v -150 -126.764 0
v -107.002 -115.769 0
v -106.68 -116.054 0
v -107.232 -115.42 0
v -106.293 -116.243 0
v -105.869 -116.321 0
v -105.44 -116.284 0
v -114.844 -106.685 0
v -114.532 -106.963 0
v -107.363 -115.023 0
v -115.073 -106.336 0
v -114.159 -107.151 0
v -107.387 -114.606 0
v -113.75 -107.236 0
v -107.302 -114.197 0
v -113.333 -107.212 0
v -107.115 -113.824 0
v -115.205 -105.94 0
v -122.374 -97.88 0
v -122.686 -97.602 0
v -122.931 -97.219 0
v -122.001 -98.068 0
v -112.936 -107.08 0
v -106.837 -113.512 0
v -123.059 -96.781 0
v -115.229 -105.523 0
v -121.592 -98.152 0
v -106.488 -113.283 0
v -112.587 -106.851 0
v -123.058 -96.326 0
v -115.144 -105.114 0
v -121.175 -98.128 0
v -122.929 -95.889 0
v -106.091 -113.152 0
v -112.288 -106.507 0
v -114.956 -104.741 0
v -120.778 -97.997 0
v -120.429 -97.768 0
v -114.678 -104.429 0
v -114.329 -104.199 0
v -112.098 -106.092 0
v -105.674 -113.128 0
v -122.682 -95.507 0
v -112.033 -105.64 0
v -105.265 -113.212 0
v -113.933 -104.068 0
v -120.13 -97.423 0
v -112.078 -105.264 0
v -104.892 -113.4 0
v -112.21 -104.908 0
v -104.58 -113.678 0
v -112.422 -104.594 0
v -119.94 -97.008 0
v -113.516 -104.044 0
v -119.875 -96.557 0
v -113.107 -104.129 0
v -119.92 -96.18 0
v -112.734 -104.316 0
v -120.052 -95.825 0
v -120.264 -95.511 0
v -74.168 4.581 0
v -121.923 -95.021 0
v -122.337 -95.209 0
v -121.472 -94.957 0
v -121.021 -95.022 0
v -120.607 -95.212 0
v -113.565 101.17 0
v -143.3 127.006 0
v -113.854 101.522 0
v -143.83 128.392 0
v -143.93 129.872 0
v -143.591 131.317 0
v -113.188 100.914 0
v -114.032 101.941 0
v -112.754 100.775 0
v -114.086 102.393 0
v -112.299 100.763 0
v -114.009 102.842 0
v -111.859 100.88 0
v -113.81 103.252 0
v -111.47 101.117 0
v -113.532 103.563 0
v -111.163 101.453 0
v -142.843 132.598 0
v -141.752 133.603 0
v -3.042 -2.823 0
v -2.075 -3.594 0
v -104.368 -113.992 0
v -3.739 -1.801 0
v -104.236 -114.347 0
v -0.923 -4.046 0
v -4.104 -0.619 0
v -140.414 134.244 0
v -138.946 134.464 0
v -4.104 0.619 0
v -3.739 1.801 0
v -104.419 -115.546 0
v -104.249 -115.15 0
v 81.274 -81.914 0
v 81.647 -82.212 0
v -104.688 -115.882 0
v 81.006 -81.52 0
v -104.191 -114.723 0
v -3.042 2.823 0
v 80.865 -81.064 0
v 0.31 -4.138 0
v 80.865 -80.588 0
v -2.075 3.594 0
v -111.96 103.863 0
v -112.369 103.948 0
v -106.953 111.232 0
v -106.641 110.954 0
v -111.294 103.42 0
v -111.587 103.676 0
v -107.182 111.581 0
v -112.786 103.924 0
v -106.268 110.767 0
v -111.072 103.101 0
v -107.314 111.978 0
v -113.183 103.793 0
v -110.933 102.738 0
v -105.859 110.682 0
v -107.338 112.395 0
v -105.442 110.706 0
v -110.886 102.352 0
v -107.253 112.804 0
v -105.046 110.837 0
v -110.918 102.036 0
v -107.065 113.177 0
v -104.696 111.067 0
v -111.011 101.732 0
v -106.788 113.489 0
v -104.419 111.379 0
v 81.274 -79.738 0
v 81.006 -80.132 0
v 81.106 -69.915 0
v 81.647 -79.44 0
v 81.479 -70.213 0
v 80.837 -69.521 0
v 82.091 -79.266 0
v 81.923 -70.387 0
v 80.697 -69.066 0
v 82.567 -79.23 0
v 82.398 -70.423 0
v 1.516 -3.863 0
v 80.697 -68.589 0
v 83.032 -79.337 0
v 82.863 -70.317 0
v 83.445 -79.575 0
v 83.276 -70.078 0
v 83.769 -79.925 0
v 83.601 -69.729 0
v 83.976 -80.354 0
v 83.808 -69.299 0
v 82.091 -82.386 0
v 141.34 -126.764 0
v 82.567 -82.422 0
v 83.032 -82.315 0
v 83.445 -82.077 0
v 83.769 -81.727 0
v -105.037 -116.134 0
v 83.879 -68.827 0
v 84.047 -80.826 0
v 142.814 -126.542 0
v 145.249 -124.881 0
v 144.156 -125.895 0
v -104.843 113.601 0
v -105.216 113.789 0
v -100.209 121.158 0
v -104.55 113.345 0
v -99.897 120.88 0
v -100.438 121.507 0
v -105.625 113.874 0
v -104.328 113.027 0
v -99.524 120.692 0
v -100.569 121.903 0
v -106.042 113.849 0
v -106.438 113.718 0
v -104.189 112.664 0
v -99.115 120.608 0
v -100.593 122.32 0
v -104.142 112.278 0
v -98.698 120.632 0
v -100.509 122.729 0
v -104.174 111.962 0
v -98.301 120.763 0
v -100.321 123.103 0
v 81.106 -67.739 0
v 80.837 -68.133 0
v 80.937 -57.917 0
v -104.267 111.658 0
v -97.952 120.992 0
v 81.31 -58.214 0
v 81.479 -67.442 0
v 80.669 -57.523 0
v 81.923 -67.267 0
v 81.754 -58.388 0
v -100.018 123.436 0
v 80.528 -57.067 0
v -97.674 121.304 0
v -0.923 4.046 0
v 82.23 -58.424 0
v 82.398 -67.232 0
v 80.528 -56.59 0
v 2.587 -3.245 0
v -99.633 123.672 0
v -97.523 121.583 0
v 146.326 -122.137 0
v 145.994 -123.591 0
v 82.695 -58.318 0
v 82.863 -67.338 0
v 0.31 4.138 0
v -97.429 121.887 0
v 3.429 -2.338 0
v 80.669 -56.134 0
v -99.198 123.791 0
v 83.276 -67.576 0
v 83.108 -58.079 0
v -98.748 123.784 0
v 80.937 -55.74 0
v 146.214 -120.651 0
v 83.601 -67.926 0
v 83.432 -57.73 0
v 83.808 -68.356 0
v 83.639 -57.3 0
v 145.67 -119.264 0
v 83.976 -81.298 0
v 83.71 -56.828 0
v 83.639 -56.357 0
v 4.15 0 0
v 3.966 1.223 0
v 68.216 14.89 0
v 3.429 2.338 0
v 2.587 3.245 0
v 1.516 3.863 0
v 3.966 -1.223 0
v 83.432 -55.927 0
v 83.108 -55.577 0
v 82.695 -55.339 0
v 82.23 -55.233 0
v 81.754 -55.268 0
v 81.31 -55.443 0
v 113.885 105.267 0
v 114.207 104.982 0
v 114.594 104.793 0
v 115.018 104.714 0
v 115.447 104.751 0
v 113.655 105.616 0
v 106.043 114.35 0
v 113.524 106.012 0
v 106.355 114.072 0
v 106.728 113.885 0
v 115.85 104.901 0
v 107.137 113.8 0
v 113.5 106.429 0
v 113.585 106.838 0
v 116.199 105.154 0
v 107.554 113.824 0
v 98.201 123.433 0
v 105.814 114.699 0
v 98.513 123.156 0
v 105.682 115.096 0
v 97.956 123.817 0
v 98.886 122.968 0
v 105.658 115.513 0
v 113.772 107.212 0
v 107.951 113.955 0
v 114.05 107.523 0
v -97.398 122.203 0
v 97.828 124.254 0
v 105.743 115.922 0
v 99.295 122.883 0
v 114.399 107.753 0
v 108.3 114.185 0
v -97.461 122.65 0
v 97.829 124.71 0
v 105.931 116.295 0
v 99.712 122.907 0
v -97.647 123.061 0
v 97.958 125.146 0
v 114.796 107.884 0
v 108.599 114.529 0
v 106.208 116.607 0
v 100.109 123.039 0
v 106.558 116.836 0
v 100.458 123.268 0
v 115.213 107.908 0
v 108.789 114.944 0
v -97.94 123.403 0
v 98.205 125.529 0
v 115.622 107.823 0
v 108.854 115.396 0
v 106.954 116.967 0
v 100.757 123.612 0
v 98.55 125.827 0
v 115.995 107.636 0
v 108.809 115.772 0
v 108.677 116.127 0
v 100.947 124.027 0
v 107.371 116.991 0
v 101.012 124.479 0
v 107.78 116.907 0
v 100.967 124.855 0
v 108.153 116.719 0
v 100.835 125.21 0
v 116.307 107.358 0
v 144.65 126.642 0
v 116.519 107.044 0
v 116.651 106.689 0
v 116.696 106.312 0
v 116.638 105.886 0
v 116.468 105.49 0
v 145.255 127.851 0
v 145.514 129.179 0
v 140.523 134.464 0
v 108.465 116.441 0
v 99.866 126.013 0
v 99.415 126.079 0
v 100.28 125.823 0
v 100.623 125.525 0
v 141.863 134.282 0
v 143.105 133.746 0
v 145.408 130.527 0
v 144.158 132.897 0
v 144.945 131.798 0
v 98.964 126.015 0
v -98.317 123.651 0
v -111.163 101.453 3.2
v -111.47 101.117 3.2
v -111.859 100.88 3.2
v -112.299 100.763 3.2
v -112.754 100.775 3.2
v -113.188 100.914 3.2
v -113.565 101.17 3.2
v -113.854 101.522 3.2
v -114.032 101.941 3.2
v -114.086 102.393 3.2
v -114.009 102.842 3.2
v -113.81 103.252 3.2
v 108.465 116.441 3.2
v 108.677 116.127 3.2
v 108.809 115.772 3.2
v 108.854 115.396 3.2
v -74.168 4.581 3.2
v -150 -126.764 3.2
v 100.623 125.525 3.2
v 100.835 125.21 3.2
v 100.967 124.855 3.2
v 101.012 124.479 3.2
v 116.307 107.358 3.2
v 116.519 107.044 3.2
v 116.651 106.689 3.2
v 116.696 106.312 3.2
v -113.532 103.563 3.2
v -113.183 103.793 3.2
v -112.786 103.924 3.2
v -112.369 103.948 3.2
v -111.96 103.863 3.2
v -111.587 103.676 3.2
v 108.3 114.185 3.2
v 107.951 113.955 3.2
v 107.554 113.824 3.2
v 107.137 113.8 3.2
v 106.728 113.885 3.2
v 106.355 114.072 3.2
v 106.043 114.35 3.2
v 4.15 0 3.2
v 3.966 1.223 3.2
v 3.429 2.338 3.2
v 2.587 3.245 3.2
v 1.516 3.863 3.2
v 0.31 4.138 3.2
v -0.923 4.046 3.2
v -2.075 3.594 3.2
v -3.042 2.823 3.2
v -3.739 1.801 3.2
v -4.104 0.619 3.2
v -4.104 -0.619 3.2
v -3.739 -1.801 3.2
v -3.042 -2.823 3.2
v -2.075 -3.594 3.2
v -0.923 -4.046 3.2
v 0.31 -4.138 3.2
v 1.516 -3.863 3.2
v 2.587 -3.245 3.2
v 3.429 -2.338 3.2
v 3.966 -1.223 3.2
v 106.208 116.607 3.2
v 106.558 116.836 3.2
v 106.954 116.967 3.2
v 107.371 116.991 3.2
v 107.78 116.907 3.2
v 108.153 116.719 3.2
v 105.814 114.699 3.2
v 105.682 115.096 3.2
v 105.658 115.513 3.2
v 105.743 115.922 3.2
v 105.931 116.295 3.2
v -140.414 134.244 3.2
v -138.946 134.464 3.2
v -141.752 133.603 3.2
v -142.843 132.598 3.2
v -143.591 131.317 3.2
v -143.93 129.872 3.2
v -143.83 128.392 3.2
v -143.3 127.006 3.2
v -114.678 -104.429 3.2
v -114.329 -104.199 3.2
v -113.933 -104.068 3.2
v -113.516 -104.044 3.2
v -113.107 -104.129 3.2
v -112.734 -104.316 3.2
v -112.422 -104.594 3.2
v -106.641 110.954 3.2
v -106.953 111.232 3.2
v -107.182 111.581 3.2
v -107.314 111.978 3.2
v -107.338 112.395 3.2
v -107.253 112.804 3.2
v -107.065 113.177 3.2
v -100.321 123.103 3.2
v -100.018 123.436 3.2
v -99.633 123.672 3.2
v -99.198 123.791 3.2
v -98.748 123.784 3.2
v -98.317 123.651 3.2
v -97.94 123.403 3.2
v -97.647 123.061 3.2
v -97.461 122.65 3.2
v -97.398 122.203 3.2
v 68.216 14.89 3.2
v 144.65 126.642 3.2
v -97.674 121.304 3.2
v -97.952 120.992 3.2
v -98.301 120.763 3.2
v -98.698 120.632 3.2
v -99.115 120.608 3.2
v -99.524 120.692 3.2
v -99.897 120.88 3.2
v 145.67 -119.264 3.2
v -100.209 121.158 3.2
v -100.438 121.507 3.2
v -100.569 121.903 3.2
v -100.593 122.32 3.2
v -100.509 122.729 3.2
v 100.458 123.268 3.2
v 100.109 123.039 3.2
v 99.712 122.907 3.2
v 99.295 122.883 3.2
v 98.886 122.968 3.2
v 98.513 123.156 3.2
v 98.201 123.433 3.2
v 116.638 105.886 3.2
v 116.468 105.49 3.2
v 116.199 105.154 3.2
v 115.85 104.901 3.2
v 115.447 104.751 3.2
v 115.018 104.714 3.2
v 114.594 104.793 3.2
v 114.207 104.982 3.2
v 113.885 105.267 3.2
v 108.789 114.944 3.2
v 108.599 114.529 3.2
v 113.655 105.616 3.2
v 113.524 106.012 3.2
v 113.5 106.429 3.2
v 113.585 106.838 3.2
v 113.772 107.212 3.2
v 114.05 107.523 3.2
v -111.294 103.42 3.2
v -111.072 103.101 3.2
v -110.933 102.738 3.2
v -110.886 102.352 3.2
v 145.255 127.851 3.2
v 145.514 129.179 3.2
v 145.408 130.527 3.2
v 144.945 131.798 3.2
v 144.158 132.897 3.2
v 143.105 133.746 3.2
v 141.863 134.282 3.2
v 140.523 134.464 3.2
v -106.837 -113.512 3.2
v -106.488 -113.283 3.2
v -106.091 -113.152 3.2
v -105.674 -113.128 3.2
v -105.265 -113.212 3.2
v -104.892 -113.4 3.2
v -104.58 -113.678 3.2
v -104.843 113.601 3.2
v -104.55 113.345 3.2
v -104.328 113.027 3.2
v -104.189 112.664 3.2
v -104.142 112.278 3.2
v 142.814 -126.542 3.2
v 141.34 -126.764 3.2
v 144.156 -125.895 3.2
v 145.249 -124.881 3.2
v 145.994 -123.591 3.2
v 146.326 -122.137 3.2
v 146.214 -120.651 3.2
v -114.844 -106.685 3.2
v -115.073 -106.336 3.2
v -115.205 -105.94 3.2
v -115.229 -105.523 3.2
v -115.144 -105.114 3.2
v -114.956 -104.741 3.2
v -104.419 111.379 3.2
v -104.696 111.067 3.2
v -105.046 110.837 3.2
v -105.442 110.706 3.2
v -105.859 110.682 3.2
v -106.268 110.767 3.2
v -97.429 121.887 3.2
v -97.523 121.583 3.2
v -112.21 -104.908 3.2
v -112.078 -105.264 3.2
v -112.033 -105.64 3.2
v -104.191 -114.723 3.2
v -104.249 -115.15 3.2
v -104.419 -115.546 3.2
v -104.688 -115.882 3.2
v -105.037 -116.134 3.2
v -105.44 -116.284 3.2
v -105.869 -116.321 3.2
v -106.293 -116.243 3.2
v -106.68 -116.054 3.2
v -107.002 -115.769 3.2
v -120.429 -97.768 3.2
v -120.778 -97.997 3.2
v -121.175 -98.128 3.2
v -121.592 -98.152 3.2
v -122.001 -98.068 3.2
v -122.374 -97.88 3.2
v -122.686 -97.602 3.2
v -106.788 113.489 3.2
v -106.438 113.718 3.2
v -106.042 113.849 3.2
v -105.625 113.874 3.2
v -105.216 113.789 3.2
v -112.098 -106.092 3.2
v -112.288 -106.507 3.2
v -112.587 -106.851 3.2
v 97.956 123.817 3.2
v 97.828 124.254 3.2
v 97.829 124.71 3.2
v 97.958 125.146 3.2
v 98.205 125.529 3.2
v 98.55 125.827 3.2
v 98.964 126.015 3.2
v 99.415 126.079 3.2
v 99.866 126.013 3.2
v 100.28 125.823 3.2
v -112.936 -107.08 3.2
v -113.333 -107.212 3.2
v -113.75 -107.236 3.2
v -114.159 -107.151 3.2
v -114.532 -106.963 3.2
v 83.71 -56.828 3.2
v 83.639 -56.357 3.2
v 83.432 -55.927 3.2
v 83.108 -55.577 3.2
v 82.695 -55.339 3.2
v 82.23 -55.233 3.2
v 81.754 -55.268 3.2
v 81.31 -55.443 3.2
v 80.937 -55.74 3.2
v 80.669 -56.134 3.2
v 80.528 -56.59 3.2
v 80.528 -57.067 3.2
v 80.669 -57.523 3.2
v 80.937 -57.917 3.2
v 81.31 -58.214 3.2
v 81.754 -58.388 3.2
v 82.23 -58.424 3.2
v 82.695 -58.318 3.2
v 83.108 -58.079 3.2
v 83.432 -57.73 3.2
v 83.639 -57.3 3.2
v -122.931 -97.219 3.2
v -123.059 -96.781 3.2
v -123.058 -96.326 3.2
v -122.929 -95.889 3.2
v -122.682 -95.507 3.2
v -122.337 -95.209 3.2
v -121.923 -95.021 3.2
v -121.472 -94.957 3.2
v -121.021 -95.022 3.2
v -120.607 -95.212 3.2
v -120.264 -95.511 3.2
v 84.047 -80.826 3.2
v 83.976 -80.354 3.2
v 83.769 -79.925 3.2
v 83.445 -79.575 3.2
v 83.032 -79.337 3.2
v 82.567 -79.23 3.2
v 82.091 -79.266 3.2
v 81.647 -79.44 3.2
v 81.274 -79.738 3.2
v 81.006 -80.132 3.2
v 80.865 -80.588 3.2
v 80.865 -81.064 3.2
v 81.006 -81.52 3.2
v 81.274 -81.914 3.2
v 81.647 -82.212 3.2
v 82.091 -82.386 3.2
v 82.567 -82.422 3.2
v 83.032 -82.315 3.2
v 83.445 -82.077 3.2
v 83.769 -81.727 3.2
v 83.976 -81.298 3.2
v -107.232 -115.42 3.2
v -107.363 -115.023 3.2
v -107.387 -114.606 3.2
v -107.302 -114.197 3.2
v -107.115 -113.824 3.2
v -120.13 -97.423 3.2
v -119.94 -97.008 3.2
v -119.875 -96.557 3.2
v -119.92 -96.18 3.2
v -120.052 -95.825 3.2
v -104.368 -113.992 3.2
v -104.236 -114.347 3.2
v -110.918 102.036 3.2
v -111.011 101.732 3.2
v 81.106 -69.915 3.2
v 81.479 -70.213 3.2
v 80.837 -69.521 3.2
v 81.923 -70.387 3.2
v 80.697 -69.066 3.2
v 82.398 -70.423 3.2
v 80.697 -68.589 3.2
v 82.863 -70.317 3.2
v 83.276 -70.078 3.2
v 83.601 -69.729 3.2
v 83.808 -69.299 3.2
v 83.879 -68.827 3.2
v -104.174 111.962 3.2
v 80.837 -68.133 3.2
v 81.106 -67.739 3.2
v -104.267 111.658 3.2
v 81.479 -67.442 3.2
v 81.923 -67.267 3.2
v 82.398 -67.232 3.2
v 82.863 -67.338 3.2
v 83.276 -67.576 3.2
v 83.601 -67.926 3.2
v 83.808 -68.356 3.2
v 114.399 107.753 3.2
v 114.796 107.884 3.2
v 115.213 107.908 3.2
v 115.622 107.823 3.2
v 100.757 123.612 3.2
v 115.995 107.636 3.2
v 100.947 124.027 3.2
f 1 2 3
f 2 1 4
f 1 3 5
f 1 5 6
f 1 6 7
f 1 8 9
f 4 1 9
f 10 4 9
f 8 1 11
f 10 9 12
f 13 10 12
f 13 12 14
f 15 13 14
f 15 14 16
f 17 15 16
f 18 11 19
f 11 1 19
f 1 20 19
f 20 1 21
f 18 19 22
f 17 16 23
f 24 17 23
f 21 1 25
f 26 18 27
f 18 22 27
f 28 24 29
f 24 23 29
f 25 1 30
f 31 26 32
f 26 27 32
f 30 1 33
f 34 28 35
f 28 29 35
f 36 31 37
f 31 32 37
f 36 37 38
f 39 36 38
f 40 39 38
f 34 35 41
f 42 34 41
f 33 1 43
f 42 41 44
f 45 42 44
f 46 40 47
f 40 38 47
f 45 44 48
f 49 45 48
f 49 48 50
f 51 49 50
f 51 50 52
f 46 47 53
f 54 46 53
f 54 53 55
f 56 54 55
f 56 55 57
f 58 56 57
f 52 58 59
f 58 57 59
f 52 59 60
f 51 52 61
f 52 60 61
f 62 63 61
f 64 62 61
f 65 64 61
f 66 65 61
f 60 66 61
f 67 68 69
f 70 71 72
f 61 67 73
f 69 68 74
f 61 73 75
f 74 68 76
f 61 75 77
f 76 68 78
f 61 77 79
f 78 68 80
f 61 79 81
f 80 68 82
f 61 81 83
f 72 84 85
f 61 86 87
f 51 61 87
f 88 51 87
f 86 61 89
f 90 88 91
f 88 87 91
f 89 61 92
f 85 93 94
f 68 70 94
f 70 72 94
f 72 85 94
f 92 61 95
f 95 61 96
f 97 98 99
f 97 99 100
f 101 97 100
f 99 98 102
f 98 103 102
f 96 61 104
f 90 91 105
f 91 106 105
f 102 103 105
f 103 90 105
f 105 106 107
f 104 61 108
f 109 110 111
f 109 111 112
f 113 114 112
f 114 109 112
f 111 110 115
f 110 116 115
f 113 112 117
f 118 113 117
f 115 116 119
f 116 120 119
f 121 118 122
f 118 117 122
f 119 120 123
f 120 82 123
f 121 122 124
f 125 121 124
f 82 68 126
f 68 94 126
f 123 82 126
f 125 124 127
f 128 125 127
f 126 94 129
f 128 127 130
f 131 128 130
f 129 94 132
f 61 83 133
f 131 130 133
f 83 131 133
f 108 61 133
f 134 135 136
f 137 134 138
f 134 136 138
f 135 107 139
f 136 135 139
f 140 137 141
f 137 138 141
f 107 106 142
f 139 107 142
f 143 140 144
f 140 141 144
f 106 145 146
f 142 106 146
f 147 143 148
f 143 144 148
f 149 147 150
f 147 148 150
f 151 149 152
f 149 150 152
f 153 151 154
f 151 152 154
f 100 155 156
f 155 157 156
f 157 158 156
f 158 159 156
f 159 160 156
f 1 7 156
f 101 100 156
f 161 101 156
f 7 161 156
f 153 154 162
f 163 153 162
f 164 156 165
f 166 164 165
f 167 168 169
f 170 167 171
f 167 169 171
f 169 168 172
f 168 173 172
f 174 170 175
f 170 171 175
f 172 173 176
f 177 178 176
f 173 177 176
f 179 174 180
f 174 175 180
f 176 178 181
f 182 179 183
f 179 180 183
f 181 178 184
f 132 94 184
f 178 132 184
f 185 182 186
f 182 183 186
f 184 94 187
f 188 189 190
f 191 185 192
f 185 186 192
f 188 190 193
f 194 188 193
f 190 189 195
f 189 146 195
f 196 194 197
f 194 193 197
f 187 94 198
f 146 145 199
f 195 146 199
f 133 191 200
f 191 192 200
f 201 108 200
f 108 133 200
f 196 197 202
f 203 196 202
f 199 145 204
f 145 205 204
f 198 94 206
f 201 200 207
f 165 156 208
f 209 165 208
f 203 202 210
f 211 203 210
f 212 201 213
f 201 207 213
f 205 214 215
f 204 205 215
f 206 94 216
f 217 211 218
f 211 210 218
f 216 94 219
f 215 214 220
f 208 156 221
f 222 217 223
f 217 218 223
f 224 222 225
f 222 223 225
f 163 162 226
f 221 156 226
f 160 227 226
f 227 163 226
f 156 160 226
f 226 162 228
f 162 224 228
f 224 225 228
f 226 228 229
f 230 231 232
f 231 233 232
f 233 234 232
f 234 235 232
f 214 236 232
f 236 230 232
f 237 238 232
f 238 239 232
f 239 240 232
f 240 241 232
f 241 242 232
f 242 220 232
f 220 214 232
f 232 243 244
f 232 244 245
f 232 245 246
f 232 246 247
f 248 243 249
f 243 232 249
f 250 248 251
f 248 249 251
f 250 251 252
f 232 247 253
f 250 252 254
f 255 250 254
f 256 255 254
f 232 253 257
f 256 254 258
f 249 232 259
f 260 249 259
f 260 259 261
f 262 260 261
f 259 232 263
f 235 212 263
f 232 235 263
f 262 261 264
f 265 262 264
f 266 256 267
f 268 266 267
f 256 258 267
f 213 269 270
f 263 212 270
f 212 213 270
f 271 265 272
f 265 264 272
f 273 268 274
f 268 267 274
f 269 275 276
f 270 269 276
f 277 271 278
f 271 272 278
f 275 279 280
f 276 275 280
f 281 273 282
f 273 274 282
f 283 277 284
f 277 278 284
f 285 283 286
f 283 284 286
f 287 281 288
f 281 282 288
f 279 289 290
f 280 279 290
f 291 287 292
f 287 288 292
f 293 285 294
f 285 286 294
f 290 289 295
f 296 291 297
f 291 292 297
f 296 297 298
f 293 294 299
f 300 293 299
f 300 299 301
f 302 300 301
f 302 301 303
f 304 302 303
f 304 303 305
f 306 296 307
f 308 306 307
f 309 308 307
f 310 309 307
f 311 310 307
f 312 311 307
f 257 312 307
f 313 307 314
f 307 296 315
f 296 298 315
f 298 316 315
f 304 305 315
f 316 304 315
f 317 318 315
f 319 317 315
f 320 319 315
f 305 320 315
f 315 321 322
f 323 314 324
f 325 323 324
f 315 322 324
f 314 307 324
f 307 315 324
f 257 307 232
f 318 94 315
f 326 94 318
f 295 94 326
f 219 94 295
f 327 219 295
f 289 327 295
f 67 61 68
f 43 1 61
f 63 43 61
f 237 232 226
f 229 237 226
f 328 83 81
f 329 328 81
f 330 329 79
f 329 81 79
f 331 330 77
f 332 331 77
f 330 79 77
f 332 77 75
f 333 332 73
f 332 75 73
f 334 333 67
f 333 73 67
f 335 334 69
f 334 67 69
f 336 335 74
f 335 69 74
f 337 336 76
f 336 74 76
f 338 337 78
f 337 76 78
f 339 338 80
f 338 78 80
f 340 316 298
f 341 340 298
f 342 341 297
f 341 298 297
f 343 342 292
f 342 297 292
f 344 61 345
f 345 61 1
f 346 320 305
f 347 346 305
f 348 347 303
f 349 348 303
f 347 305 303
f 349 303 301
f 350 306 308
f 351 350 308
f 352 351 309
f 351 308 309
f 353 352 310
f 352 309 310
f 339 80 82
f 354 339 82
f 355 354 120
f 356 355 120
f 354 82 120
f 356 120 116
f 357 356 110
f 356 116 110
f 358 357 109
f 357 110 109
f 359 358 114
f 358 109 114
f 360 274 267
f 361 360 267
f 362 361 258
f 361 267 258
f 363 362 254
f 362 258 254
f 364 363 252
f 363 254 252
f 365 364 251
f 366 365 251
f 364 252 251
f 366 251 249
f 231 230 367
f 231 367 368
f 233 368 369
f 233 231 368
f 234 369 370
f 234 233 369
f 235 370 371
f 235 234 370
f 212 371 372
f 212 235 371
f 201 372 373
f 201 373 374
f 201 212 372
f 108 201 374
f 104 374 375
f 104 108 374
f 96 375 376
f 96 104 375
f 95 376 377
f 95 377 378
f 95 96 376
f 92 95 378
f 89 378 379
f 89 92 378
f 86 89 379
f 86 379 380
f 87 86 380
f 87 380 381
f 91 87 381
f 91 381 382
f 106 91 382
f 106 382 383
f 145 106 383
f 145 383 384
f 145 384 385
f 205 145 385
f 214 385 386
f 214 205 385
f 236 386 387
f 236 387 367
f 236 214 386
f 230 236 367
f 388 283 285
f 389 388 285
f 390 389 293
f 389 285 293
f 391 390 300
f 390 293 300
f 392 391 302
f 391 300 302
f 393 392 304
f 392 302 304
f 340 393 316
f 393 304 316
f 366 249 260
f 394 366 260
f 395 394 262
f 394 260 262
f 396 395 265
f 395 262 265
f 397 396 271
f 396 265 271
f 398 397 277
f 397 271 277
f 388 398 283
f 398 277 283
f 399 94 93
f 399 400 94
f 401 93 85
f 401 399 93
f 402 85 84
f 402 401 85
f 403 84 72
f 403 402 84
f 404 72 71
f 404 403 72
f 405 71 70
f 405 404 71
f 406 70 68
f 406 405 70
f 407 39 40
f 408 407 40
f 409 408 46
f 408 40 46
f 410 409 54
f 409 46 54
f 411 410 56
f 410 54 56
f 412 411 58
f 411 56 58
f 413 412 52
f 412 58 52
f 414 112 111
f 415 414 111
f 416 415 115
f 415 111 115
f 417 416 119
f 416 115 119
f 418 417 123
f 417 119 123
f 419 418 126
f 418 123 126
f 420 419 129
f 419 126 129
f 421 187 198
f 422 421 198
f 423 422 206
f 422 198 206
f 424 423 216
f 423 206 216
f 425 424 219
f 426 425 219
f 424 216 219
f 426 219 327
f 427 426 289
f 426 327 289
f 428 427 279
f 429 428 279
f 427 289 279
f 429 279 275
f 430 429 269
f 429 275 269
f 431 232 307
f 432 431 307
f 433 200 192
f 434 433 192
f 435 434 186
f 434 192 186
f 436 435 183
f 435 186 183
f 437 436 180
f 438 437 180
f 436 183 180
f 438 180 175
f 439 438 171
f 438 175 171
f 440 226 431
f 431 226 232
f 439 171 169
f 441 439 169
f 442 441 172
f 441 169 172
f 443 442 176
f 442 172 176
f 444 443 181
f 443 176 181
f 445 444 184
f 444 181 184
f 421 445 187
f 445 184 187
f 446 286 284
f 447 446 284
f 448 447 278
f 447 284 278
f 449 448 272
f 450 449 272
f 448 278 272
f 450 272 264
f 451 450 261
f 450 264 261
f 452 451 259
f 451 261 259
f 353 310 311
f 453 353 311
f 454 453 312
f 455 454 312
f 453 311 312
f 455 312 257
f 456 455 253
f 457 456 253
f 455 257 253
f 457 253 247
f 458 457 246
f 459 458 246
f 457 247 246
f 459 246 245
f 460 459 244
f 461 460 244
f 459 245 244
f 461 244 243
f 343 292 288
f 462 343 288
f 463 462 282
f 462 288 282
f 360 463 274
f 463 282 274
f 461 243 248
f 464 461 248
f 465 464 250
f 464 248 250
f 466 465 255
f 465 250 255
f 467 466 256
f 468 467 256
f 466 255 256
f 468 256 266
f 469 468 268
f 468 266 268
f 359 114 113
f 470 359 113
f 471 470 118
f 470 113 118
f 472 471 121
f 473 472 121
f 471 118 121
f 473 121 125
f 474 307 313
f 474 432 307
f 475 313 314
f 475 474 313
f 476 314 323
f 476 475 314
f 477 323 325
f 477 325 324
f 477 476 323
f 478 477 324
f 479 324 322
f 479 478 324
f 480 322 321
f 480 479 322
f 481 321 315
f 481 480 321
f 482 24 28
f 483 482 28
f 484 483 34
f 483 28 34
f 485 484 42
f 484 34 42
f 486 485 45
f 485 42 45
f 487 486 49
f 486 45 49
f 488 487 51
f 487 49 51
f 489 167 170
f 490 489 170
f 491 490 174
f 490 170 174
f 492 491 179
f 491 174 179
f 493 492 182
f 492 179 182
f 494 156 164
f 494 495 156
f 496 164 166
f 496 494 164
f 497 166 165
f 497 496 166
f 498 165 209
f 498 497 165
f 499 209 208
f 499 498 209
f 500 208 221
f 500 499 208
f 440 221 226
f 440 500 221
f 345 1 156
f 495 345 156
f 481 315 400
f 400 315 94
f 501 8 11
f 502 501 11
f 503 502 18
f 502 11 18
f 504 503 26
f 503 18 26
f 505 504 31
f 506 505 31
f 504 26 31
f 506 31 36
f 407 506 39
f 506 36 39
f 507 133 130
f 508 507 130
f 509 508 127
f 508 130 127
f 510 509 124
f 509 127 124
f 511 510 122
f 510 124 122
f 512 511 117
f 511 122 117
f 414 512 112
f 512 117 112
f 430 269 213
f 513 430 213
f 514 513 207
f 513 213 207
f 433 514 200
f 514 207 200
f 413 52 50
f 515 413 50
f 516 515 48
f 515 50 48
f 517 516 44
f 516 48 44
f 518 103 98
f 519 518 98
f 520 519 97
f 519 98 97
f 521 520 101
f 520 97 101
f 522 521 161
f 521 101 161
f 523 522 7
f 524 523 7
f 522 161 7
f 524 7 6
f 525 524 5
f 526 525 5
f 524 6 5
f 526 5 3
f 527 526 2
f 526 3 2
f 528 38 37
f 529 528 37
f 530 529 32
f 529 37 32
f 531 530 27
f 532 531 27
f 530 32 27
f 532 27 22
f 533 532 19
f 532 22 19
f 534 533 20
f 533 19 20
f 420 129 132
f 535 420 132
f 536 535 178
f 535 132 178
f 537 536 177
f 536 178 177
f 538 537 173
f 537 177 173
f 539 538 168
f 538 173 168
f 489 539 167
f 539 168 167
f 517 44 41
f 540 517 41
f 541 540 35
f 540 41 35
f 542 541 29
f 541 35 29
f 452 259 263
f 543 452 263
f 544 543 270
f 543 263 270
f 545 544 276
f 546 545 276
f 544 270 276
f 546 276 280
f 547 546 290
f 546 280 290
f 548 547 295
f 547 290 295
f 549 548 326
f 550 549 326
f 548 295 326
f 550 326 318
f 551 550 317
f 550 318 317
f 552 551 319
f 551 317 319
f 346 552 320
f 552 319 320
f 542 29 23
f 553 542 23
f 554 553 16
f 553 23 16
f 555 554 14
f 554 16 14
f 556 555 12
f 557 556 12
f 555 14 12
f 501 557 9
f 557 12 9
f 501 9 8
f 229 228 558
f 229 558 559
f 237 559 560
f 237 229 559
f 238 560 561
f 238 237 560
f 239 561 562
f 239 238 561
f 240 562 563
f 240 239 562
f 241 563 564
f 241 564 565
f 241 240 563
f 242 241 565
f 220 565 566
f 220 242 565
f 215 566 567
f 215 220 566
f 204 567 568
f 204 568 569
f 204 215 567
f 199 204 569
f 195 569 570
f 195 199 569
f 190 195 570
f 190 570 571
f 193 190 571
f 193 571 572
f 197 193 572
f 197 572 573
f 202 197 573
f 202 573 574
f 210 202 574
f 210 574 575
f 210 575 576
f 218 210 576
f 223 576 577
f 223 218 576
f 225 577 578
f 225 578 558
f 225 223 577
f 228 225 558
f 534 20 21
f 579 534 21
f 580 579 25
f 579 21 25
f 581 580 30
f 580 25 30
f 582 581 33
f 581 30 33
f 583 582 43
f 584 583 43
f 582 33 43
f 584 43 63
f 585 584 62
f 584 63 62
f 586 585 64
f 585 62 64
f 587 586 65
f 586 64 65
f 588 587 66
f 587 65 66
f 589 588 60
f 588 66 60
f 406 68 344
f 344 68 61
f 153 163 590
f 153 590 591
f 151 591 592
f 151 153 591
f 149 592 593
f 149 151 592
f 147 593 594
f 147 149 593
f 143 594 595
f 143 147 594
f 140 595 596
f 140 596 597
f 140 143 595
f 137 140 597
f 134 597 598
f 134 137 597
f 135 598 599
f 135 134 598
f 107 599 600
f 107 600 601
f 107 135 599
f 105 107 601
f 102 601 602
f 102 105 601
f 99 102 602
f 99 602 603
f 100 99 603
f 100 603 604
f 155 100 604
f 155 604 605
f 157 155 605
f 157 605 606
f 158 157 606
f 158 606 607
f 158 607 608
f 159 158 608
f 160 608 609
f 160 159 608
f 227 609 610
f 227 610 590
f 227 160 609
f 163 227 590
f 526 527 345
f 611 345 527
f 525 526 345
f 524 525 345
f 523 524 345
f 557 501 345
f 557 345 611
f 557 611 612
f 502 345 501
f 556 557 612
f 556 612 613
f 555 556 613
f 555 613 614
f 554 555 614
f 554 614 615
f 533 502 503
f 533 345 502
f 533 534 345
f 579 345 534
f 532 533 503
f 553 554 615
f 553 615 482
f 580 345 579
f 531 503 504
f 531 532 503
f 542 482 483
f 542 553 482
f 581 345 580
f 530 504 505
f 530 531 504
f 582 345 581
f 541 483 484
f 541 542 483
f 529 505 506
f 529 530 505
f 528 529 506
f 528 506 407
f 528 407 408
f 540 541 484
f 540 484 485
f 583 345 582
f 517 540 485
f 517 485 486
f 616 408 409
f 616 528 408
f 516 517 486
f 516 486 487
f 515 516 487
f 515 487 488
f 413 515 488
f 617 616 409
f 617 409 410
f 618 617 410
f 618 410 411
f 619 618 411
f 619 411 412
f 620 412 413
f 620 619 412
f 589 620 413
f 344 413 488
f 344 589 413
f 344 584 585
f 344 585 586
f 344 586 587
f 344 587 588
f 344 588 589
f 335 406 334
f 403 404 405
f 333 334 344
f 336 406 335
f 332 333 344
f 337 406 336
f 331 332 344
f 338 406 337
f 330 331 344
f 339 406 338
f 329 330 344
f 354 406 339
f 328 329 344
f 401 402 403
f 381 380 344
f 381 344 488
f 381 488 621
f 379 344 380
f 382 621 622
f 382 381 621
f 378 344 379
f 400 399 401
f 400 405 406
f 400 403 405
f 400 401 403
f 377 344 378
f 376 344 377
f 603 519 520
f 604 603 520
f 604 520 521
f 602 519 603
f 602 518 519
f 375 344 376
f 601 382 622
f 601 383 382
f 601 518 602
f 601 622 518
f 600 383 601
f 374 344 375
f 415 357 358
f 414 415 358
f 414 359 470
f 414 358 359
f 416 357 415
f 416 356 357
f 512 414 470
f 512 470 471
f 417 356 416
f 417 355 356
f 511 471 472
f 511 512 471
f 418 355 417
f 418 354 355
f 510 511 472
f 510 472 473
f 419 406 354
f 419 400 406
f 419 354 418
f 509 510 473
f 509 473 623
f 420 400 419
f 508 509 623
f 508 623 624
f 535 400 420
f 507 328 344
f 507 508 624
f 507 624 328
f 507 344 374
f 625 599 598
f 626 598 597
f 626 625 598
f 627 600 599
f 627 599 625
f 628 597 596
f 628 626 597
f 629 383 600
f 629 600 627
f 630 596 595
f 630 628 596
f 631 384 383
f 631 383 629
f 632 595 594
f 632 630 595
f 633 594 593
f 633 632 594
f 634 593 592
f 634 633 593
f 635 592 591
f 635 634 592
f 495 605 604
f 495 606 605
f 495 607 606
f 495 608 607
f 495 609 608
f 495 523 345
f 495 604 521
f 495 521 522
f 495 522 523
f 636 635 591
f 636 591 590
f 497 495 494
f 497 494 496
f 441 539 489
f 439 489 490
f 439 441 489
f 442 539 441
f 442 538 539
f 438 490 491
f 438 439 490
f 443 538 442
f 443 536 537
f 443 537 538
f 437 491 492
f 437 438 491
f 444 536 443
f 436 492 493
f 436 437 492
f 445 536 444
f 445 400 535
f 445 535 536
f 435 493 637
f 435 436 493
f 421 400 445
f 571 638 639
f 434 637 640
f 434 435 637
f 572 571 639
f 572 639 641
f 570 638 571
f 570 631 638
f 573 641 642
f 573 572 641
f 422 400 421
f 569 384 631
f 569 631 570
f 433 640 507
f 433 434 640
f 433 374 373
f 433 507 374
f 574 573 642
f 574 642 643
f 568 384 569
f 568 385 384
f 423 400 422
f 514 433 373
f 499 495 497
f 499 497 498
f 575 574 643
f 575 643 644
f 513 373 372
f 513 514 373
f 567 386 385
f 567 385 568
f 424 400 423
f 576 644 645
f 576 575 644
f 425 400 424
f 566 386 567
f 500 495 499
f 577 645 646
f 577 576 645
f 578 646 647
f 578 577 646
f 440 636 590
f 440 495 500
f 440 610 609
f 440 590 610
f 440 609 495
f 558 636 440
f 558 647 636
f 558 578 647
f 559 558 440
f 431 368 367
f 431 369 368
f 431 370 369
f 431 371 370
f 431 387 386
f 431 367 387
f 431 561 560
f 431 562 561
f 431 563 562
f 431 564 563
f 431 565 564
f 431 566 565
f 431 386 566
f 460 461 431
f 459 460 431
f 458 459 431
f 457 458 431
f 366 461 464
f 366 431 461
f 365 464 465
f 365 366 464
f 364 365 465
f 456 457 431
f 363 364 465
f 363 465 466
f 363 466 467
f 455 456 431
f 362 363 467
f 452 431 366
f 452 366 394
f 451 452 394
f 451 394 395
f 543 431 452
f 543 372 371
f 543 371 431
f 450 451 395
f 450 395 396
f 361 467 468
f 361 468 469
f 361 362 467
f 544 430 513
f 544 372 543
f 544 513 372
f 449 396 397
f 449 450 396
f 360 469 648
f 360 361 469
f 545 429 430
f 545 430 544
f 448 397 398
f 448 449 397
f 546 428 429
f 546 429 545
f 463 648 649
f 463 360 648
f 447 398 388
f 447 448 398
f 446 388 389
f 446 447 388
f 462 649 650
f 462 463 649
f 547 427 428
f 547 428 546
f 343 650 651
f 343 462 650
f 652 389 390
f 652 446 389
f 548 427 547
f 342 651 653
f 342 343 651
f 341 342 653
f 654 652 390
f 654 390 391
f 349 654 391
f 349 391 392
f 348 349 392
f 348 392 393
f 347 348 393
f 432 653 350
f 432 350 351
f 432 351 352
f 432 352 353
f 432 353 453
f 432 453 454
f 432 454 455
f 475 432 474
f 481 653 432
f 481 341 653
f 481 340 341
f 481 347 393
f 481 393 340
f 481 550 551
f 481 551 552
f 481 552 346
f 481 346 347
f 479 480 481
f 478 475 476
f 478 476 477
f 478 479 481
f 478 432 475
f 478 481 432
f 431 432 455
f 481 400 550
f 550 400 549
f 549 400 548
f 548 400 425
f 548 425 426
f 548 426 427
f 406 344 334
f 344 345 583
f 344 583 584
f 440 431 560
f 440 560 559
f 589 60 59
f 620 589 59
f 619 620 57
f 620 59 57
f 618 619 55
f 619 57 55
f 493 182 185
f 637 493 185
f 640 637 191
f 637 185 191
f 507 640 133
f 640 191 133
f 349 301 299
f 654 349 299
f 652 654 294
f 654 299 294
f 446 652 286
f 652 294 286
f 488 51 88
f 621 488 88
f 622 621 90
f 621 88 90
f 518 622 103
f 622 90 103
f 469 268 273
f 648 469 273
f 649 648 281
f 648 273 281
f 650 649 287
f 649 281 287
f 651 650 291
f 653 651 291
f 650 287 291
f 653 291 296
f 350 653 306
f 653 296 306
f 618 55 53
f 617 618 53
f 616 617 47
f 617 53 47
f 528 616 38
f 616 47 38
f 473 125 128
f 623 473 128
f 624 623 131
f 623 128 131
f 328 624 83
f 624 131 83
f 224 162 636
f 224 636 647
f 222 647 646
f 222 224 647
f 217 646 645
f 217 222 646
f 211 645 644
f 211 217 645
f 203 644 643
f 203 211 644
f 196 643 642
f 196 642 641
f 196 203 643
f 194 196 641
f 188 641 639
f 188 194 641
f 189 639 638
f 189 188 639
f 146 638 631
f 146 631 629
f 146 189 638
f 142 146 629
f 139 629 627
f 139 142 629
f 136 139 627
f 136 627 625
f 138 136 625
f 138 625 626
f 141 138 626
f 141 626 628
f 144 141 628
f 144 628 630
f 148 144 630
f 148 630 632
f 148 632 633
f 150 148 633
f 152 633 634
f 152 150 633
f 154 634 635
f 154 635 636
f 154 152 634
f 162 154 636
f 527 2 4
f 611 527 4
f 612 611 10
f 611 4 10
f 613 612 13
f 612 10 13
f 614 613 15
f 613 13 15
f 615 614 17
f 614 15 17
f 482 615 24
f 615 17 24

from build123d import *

# Parameters (mm, degrees)
F0_R     = 1.6
F0_R_2   = 4.15
F1_DEPTH = 3.2
F2_R     = 5


# Not quite as in the source:
# - a feature names something its author has since deleted; it is built from what else it names


with BuildPart() as f1:
    # F0 (on Top) → F1 (new body)
    with BuildSketch(Plane.XY):
        Polygon((-147.5119216098, 134.4644985315), (-74.1683009258, 4.5805452964), (-5.9605e-06, 133.0438004871), (68.2159057757, 14.8903754755), (149.9999940395, 134.4644985315), align=None)
        with BuildLine():
            Line((-96.8504283589, 106.236077336), (-103.5946726395, 96.3105965374))
            Line((-103.5946726395, 96.3105965374), (-111.1628517485, 101.4530828014))
            ThreePointArc((-111.1628517485, 101.4530828014), (-113.385481759, 101.0289179323), (-113.8096466281, 103.2515479429))
            Line((-113.8096466281, 103.2515479429), (-121.377825737, 108.3940342069))
            Line((-121.377825737, 108.3940342069), (-114.6335814564, 118.3195150055))
            Line((-114.6335814564, 118.3195150055), (-107.8893371757, 128.244995804))
            Line((-107.8893371757, 128.244995804), (-100.3211580668, 123.10250954))
            ThreePointArc((-100.3211580668, 123.10250954), (-98.5273543684, 123.7325637154), (-97.397760627, 122.2032769693))
            ThreePointArc((-97.397760627, 122.2032769693), (-97.4684738809, 121.7328707107), (-97.6743631872, 121.3040443985))
            Line((-97.6743631872, 121.3040443985), (-90.1061840783, 116.1615581346))
            Line((-90.1061840783, 116.1615581346), (-96.8504283589, 106.236077336))
        make_face(mode=Mode.SUBTRACT)
        with BuildLine():
            Line((115.3912264438, 122.4205616549), (123.2329658209, 113.3372184629))
            Line((123.2329658209, 113.3372184629), (116.306916637, 107.3578921879))
            ThreePointArc((116.306916637, 107.3578921879), (116.5954341459, 106.870099346), (116.6958042114, 106.3123269377))
            ThreePointArc((116.6958042114, 106.3123269377), (115.6535766198, 104.8126970032), (113.8846917858, 105.2667616874))
            Line((113.8846917858, 105.2667616874), (106.958642602, 99.2874354124))
            Line((106.958642602, 99.2874354124), (99.1169032249, 108.3707786044))
            Line((99.1169032249, 108.3707786044), (91.2751638479, 117.4541217963))
            Line((91.2751638479, 117.4541217963), (98.2012130318, 123.4334480713))
            ThreePointArc((98.2012130318, 123.4334480713), (98.3667602071, 125.6901257472), (100.6234378829, 125.5245785718))
            Line((100.6234378829, 125.5245785718), (107.5494870668, 131.5039048468))
            Line((107.5494870668, 131.5039048468), (115.3912264438, 122.4205616549))
        make_face(mode=Mode.SUBTRACT)
        Polygon((-74.1683009258, 4.5805452964), (-5.9605e-06, -126.7638206482), (49.5534456811, -23.8632776696), (68.2159057757, 14.8903754755), (-5.9605e-06, 133.0438004871), align=None)
        with BuildLine():
            ThreePointArc((55, 0), (53.6210756721, -12.2384739151), (49.5534456811, -23.8632776696))
            ThreePointArc((49.5534456811, -23.8632776696), (-53.6210756721, 12.2384739151), (55, 0))
        make_face(mode=Mode.SUBTRACT)
        Polygon((49.5534456811, -23.8632776696), (-5.9605e-06, -126.7638206482), (149.9999940395, -126.7638206482), (68.2159057757, 14.8903754755), align=None)
        with Locations((82.4472344942, -80.8260182953)):
            Circle(F0_R, mode=Mode.SUBTRACT)
        with Locations((82.2787740784, -68.8272008082)):
            Circle(F0_R, mode=Mode.SUBTRACT)
        with Locations((82.1103136625, -56.8283833211)):
            Circle(F0_R, mode=Mode.SUBTRACT)
        Polygon((-74.1683009258, 4.5805452964), (-150.0000059605, -126.7638206482), (-5.9605e-06, -126.7638206482), align=None)
        with BuildLine():
            Line((-105.4957706959, -98.6149983111), (-97.6540313188, -107.698341503))
            Line((-97.6540313188, -107.698341503), (-104.5800805027, -113.677667778))
            ThreePointArc((-104.5800805027, -113.677667778), (-104.2915629938, -114.1654606199), (-104.1911929283, -114.7232330283))
            ThreePointArc((-104.1911929283, -114.7232330283), (-105.2334205199, -116.2228629628), (-107.0023053539, -115.7687982785))
            Line((-107.0023053539, -115.7687982785), (-113.9283545378, -121.7481245535))
            Line((-113.9283545378, -121.7481245535), (-121.7700939148, -112.6647813616))
            Line((-121.7700939148, -112.6647813616), (-129.6118332918, -103.5814381696))
            Line((-129.6118332918, -103.5814381696), (-122.685784108, -97.6021118946))
            ThreePointArc((-122.685784108, -97.6021118946), (-122.5202369326, -95.3454342188), (-120.2635592568, -95.5109813941))
            Line((-120.2635592568, -95.5109813941), (-113.3375100729, -89.5316551191))
            Line((-113.3375100729, -89.5316551191), (-105.4957706959, -98.6149983111))
        make_face(mode=Mode.SUBTRACT)
        with BuildLine():
            ThreePointArc((55, 0), (-53.6210756721, 12.2384739151), (49.5534456811, -23.8632776696))
            ThreePointArc((49.5534456811, -23.8632776696), (53.6210756721, -12.2384739151), (55, 0))
        make_face()
        Circle(F0_R_2, mode=Mode.SUBTRACT)
        with BuildLine():
            Line((-111.1628517485, 101.4530828014), (-103.5946726395, 96.3105965374))
            Line((-103.5946726395, 96.3105965374), (-96.8504283589, 106.236077336))
            Line((-96.8504283589, 106.236077336), (-104.4186074678, 111.3785636))
            ThreePointArc((-104.4186074678, 111.3785636), (-105.4420750524, 110.7061594182), (-106.6412374784, 110.9543987309))
            Line((-106.6412374784, 110.9543987309), (-111.5870166175, 103.6757128119))
            ThreePointArc((-111.5870166175, 103.6757128119), (-111.0722527043, 103.1010569453), (-110.8862491883, 102.3523153721))
            ThreePointArc((-110.8862491883, 102.3523153721), (-110.9569624422, 101.8819091135), (-111.1628517485, 101.4530828014))
        make_face()
        with BuildLine():
            Line((-104.4186074678, 111.3785636), (-96.8504283589, 106.236077336))
            Line((-96.8504283589, 106.236077336), (-90.1061840783, 116.1615581346))
            Line((-90.1061840783, 116.1615581346), (-97.6743631872, 121.3040443985))
            ThreePointArc((-97.6743631872, 121.3040443985), (-98.6978307717, 120.6316402168), (-99.8969931977, 120.8798795295))
            Line((-99.8969931977, 120.8798795295), (-104.8427723369, 113.6011936105))
            ThreePointArc((-104.8427723369, 113.6011936105), (-104.3280084237, 113.0265377439), (-104.1420049076, 112.2777961707))
            ThreePointArc((-104.1420049076, 112.2777961707), (-104.2127181615, 111.8073899121), (-104.4186074678, 111.3785636))
        make_face()
        with BuildLine():
            Line((-121.377825737, 108.3940342069), (-113.8096466281, 103.2515479429))
            ThreePointArc((-113.8096466281, 103.2515479429), (-112.7861790435, 103.9239521247), (-111.5870166175, 103.6757128119))
            Line((-111.5870166175, 103.6757128119), (-106.6412374784, 110.9543987309))
            ThreePointArc((-106.6412374784, 110.9543987309), (-107.3136416602, 111.9778663155), (-107.0654023474, 113.1770287415))
            Line((-107.0654023474, 113.1770287415), (-114.6335814564, 118.3195150055))
            Line((-114.6335814564, 118.3195150055), (-121.377825737, 108.3940342069))
        make_face()
        with BuildLine():
            Line((-107.8893371757, 128.244995804), (-114.6335814564, 118.3195150055))
            Line((-114.6335814564, 118.3195150055), (-107.0654023474, 113.1770287415))
            ThreePointArc((-107.0654023474, 113.1770287415), (-106.0419347629, 113.8494329232), (-104.8427723369, 113.6011936105))
            Line((-104.8427723369, 113.6011936105), (-99.8969931977, 120.8798795295))
            ThreePointArc((-99.8969931977, 120.8798795295), (-100.5693973795, 121.903347114), (-100.3211580668, 123.10250954))
            Line((-100.3211580668, 123.10250954), (-107.8893371757, 128.244995804))
        make_face()
        with BuildLine():
            Line((-104.5800805027, -113.677667778), (-97.6540313188, -107.698341503))
            Line((-97.6540313188, -107.698341503), (-105.4957706959, -98.6149983111))
            Line((-105.4957706959, -98.6149983111), (-112.4218198797, -104.594324586))
            ThreePointArc((-112.4218198797, -104.594324586), (-112.1333023708, -105.082117428), (-112.0329323053, -105.6398898363))
            ThreePointArc((-112.0329323053, -105.6398898363), (-112.1781291571, -106.30588368), (-112.5873670551, -106.8510022619))
            Line((-112.5873670551, -106.8510022619), (-106.8367581786, -113.5121206027))
            ThreePointArc((-106.8367581786, -113.5121206027), (-105.674133398, -113.1275209407), (-104.5800805027, -113.677667778))
        make_face()
        with BuildLine():
            Line((-112.4218198797, -104.594324586), (-105.4957706959, -98.6149983111))
            Line((-105.4957706959, -98.6149983111), (-113.3375100729, -89.5316551191))
            Line((-113.3375100729, -89.5316551191), (-120.2635592568, -95.5109813941))
            ThreePointArc((-120.2635592568, -95.5109813941), (-119.9750417479, -95.998774236), (-119.8746716824, -96.5565466444))
            ThreePointArc((-119.8746716824, -96.5565466444), (-120.0198685341, -97.222540488), (-120.4291064321, -97.76765907))
            Line((-120.4291064321, -97.76765907), (-114.6784975556, -104.4287774107))
            ThreePointArc((-114.6784975556, -104.4287774107), (-113.5158727751, -104.0441777488), (-112.4218198797, -104.594324586))
        make_face()
        with BuildLine():
            ThreePointArc((-107.0023053539, -115.7687982785), (-107.3869050159, -114.606173498), (-106.8367581786, -113.5121206027))
            Line((-106.8367581786, -113.5121206027), (-112.5873670551, -106.8510022619))
            ThreePointArc((-112.5873670551, -106.8510022619), (-113.7499918356, -107.2356019239), (-114.8440447309, -106.6854550866))
            Line((-114.8440447309, -106.6854550866), (-121.7700939148, -112.6647813616))
            Line((-121.7700939148, -112.6647813616), (-113.9283545378, -121.7481245535))
            Line((-113.9283545378, -121.7481245535), (-107.0023053539, -115.7687982785))
        make_face()
        with BuildLine():
            ThreePointArc((-114.8440447309, -106.6854550866), (-115.2286443929, -105.522830306), (-114.6784975556, -104.4287774107))
            Line((-114.6784975556, -104.4287774107), (-120.4291064321, -97.76765907))
            ThreePointArc((-120.4291064321, -97.76765907), (-121.5917312126, -98.1522587319), (-122.685784108, -97.6021118946))
            Line((-122.685784108, -97.6021118946), (-129.6118332918, -103.5814381696))
            Line((-129.6118332918, -103.5814381696), (-121.7700939148, -112.6647813616))
            Line((-121.7700939148, -112.6647813616), (-114.8440447309, -106.6854550866))
        make_face()
        with BuildLine():
            Line((116.306916637, 107.3578921879), (123.2329658209, 113.3372184629))
            Line((123.2329658209, 113.3372184629), (115.3912264438, 122.4205616549))
            Line((115.3912264438, 122.4205616549), (108.46517726, 116.4412353799))
            ThreePointArc((108.46517726, 116.4412353799), (108.7536947689, 115.953442538), (108.8540648344, 115.3956701296))
            ThreePointArc((108.8540648344, 115.3956701296), (108.7088679827, 114.729676286), (108.2996300847, 114.184557704))
            Line((108.2996300847, 114.184557704), (114.0502389611, 107.5234393633))
            ThreePointArc((114.0502389611, 107.5234393633), (115.2128637417, 107.9080390252), (116.306916637, 107.3578921879))
        make_face()
        with BuildLine():
            Line((108.46517726, 116.4412353799), (115.3912264438, 122.4205616549))
            Line((115.3912264438, 122.4205616549), (107.5494870668, 131.5039048468))
            Line((107.5494870668, 131.5039048468), (100.6234378829, 125.5245785718))
            ThreePointArc((100.6234378829, 125.5245785718), (100.9119553919, 125.0367857299), (101.0123254573, 124.4790133216))
            ThreePointArc((101.0123254573, 124.4790133216), (100.8671286056, 123.8130194779), (100.4578907076, 123.267900896))
            Line((100.4578907076, 123.267900896), (106.2084995841, 116.6067825552))
            ThreePointArc((106.2084995841, 116.6067825552), (107.3711243647, 116.9913822172), (108.46517726, 116.4412353799))
        make_face()
        with BuildLine():
            ThreePointArc((113.8846917858, 105.2667616874), (113.5000921239, 106.4293864679), (114.0502389611, 107.5234393633))
            Line((114.0502389611, 107.5234393633), (108.2996300847, 114.184557704))
            ThreePointArc((108.2996300847, 114.184557704), (107.1370053041, 113.7999580421), (106.0429524088, 114.3501048793))
            Line((106.0429524088, 114.3501048793), (99.1169032249, 108.3707786044))
            Line((99.1169032249, 108.3707786044), (106.958642602, 99.2874354124))
            Line((106.958642602, 99.2874354124), (113.8846917858, 105.2667616874))
        make_face()
        with BuildLine():
            ThreePointArc((106.0429524088, 114.3501048793), (105.6583527468, 115.5127296599), (106.2084995841, 116.6067825552))
            Line((106.2084995841, 116.6067825552), (100.4578907076, 123.267900896))
            ThreePointArc((100.4578907076, 123.267900896), (99.2952659271, 122.883301234), (98.2012130318, 123.4334480713))
            Line((98.2012130318, 123.4334480713), (91.2751638479, 117.4541217963))
            Line((91.2751638479, 117.4541217963), (99.1169032249, 108.3707786044))
            Line((99.1169032249, 108.3707786044), (106.0429524088, 114.3501048793))
        make_face()
    extrude(amount=F1_DEPTH)

    # F2
    f2_edges = [f1.edges().sort_by_distance(p)[0] for p in [
        (149.999994, -126.763821, 1.6),
        (149.999994, 134.464499, 1.6),
        (-147.511922, 134.464499, 1.6),
    ]]
    fillet(f2_edges, radius=F2_R)


solid = f1.part
